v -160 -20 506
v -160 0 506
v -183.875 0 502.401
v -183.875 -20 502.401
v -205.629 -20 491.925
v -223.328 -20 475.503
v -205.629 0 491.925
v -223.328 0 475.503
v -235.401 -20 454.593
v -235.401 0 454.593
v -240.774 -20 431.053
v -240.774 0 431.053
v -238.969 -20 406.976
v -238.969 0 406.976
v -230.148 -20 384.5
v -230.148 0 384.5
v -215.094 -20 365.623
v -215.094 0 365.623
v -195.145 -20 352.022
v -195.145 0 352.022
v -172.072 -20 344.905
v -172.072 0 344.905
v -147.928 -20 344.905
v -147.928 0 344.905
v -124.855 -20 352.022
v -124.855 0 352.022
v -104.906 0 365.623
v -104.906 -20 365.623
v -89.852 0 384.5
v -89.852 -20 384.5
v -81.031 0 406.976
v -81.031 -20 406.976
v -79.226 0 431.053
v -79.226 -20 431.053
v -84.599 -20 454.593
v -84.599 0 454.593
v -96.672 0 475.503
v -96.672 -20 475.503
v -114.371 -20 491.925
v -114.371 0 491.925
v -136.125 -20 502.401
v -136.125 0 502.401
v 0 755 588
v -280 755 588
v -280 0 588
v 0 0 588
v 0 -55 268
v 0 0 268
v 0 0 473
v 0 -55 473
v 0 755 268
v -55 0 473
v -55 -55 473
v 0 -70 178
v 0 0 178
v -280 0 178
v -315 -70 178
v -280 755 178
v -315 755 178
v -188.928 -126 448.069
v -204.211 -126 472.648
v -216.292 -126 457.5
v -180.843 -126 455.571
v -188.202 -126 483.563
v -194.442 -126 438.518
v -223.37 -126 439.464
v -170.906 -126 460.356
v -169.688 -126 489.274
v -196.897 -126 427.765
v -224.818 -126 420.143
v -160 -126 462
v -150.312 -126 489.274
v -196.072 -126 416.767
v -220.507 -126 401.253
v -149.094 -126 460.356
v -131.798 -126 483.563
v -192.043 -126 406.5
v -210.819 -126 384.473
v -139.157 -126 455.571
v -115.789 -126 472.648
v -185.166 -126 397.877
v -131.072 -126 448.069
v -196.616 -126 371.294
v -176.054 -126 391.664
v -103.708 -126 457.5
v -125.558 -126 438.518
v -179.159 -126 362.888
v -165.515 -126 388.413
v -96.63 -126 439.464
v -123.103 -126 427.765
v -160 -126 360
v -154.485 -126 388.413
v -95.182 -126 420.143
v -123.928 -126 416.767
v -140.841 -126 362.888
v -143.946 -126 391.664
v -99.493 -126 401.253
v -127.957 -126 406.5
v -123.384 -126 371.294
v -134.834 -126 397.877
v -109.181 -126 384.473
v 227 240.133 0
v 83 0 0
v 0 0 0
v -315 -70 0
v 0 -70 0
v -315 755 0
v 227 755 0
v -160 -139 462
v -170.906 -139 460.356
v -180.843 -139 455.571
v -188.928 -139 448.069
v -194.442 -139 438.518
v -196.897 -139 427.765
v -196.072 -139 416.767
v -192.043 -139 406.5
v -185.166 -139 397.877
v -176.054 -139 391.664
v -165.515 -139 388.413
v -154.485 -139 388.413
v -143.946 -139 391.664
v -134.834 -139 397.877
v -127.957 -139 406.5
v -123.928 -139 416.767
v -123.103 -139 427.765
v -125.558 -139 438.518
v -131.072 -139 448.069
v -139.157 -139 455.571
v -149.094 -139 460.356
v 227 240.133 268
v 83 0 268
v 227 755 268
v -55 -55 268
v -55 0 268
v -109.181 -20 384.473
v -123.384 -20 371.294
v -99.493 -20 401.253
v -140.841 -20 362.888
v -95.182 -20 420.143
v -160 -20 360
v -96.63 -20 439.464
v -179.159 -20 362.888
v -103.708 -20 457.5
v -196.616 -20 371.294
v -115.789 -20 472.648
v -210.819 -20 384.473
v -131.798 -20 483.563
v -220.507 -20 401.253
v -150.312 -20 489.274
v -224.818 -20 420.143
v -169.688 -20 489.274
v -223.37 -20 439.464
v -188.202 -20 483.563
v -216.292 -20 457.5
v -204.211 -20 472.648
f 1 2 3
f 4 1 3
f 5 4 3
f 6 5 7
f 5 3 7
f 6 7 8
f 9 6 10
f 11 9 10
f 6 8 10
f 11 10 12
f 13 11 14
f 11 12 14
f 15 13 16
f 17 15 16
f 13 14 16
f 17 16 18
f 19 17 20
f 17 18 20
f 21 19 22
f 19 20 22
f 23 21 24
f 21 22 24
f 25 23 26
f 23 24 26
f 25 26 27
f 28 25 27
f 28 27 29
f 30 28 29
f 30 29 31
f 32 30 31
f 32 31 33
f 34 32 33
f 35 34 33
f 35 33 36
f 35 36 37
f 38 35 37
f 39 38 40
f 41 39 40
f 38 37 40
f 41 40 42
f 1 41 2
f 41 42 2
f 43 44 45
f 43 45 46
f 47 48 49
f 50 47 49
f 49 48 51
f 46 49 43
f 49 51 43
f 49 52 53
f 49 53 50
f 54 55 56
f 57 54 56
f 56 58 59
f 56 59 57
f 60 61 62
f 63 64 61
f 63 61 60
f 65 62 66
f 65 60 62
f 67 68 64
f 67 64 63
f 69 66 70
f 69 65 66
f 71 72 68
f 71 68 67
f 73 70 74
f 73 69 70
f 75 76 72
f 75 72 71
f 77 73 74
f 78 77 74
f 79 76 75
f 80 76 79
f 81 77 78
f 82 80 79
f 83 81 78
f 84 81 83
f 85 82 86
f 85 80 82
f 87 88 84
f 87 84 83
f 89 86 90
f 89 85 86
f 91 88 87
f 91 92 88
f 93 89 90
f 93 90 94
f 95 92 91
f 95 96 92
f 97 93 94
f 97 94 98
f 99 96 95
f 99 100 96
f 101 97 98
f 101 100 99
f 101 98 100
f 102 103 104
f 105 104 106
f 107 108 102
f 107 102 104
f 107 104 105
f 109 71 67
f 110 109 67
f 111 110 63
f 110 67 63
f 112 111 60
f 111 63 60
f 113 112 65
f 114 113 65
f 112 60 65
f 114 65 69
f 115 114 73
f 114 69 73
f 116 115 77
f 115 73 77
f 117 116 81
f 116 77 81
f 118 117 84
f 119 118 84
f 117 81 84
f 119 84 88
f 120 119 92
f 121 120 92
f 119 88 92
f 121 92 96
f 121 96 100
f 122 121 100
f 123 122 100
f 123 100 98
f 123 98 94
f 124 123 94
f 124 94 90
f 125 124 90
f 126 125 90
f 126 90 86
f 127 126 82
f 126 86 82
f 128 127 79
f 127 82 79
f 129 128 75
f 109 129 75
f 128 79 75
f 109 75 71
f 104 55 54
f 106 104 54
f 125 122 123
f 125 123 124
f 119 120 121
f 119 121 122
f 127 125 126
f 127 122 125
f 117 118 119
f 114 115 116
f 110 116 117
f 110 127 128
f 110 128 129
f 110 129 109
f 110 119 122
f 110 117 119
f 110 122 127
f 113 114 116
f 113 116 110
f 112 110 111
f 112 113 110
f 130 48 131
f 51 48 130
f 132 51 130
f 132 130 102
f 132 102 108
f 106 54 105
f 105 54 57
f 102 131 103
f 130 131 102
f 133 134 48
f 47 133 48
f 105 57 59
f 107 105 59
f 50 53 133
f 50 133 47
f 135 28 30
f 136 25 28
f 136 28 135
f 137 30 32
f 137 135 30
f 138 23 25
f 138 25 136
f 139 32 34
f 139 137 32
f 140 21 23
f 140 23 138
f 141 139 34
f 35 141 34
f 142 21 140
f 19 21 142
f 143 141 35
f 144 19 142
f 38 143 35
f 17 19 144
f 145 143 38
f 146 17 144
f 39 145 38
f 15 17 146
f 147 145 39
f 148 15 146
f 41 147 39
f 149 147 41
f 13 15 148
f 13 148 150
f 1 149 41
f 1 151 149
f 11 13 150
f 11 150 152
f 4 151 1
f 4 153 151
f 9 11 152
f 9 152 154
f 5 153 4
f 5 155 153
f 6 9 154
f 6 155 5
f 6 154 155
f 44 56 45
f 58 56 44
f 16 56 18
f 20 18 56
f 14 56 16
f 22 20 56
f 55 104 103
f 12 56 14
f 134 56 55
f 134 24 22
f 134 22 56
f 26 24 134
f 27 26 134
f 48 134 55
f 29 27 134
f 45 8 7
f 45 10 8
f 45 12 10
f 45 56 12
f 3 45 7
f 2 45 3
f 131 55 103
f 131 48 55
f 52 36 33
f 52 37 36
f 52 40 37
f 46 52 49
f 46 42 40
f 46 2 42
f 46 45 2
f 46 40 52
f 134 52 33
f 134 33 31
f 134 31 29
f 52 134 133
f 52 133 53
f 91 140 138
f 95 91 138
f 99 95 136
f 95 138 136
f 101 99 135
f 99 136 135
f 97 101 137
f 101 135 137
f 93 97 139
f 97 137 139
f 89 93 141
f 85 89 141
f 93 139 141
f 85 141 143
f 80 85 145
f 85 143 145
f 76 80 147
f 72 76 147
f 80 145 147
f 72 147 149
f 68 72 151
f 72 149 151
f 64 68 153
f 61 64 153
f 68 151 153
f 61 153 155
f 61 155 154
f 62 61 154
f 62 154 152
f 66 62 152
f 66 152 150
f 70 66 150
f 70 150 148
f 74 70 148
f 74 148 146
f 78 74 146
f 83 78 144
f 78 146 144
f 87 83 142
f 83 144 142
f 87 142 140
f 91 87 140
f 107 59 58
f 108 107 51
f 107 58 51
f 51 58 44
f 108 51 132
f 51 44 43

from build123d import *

# Parameters (mm, degrees)
SKETCH1_W           = 280
SKETCH1_H           = 755
BOSS_EXTRUDE1_DEPTH = 588
SKETCH4_R           = 81
BOSS_EXTRUDE2_DEPTH = 20
BOSS_EXTRUDE3_START = 20
SKETCH4_3_R         = 65
BOSS_EXTRUDE3_DEPTH = 106
BOSS_EXTRUDE4_START = 126
SKETCH4_4_R         = 37
BOSS_EXTRUDE4_DEPTH = 13
BOSS_EXTRUDE5_DEPTH = 268
BOSS_EXTRUDE6_DEPTH = 178
SKETCH7_W           = 55
SKETCH7_H           = 205
BOSS_EXTRUDE7_DEPTH = 55


with BuildPart() as part:
    # Sketch1 → Boss-Extrude1 (new body)
    with BuildSketch(Plane.XY):
        with Locations((-140, 377.5)):
            Rectangle(SKETCH1_W, SKETCH1_H)
    extrude(amount=BOSS_EXTRUDE1_DEPTH)

    # Sketch4 → Boss-Extrude2 (add)
    with BuildSketch(Plane.XZ):
        with Locations(Location((-160, 425, 0), (0, 0, 90))):
            Circle(SKETCH4_R)
    extrude(amount=BOSS_EXTRUDE2_DEPTH)

    # Sketch4<3> → Boss-Extrude3 (add)
    with BuildSketch(Plane.XZ.offset(BOSS_EXTRUDE3_START)):
        with Locations(Location((-160, 425, 0), (0, 0, 270))):
            Circle(SKETCH4_3_R)
    extrude(amount=BOSS_EXTRUDE3_DEPTH)

    # Sketch4<4> → Boss-Extrude4 (add)
    with BuildSketch(Plane.XZ.offset(BOSS_EXTRUDE4_START)):
        with Locations(Location((-160, 425, 0), (0, 0, 90))):
            Circle(SKETCH4_4_R)
    extrude(amount=BOSS_EXTRUDE4_DEPTH)

    # Sketch5 → Boss-Extrude5 (add)
    with BuildSketch(Plane(origin=(0, 0, 268), x_dir=(-1, 0, 0), z_dir=(0, 0, -1))):
        Polygon((0, 0), (-83, 0), (-227, 240.133296317), (-227, 755), (0, 755), align=None)
    extrude(amount=BOSS_EXTRUDE5_DEPTH)

    # Sketch6 → Boss-Extrude6 (add)
    with BuildSketch(Plane.XY.offset(178)):
        Polygon((-280, 0), (0, 0), (0, -70), (-315, -70), (-315, 755), (-280, 755), align=None)
    extrude(amount=-BOSS_EXTRUDE6_DEPTH)

    # Sketch7 → Boss-Extrude7 (add)
    with BuildSketch(Plane.XZ):
        with Locations((-27.5, 370.5)):
            Rectangle(SKETCH7_W, SKETCH7_H)
    extrude(amount=BOSS_EXTRUDE7_DEPTH)


solid = part.part
